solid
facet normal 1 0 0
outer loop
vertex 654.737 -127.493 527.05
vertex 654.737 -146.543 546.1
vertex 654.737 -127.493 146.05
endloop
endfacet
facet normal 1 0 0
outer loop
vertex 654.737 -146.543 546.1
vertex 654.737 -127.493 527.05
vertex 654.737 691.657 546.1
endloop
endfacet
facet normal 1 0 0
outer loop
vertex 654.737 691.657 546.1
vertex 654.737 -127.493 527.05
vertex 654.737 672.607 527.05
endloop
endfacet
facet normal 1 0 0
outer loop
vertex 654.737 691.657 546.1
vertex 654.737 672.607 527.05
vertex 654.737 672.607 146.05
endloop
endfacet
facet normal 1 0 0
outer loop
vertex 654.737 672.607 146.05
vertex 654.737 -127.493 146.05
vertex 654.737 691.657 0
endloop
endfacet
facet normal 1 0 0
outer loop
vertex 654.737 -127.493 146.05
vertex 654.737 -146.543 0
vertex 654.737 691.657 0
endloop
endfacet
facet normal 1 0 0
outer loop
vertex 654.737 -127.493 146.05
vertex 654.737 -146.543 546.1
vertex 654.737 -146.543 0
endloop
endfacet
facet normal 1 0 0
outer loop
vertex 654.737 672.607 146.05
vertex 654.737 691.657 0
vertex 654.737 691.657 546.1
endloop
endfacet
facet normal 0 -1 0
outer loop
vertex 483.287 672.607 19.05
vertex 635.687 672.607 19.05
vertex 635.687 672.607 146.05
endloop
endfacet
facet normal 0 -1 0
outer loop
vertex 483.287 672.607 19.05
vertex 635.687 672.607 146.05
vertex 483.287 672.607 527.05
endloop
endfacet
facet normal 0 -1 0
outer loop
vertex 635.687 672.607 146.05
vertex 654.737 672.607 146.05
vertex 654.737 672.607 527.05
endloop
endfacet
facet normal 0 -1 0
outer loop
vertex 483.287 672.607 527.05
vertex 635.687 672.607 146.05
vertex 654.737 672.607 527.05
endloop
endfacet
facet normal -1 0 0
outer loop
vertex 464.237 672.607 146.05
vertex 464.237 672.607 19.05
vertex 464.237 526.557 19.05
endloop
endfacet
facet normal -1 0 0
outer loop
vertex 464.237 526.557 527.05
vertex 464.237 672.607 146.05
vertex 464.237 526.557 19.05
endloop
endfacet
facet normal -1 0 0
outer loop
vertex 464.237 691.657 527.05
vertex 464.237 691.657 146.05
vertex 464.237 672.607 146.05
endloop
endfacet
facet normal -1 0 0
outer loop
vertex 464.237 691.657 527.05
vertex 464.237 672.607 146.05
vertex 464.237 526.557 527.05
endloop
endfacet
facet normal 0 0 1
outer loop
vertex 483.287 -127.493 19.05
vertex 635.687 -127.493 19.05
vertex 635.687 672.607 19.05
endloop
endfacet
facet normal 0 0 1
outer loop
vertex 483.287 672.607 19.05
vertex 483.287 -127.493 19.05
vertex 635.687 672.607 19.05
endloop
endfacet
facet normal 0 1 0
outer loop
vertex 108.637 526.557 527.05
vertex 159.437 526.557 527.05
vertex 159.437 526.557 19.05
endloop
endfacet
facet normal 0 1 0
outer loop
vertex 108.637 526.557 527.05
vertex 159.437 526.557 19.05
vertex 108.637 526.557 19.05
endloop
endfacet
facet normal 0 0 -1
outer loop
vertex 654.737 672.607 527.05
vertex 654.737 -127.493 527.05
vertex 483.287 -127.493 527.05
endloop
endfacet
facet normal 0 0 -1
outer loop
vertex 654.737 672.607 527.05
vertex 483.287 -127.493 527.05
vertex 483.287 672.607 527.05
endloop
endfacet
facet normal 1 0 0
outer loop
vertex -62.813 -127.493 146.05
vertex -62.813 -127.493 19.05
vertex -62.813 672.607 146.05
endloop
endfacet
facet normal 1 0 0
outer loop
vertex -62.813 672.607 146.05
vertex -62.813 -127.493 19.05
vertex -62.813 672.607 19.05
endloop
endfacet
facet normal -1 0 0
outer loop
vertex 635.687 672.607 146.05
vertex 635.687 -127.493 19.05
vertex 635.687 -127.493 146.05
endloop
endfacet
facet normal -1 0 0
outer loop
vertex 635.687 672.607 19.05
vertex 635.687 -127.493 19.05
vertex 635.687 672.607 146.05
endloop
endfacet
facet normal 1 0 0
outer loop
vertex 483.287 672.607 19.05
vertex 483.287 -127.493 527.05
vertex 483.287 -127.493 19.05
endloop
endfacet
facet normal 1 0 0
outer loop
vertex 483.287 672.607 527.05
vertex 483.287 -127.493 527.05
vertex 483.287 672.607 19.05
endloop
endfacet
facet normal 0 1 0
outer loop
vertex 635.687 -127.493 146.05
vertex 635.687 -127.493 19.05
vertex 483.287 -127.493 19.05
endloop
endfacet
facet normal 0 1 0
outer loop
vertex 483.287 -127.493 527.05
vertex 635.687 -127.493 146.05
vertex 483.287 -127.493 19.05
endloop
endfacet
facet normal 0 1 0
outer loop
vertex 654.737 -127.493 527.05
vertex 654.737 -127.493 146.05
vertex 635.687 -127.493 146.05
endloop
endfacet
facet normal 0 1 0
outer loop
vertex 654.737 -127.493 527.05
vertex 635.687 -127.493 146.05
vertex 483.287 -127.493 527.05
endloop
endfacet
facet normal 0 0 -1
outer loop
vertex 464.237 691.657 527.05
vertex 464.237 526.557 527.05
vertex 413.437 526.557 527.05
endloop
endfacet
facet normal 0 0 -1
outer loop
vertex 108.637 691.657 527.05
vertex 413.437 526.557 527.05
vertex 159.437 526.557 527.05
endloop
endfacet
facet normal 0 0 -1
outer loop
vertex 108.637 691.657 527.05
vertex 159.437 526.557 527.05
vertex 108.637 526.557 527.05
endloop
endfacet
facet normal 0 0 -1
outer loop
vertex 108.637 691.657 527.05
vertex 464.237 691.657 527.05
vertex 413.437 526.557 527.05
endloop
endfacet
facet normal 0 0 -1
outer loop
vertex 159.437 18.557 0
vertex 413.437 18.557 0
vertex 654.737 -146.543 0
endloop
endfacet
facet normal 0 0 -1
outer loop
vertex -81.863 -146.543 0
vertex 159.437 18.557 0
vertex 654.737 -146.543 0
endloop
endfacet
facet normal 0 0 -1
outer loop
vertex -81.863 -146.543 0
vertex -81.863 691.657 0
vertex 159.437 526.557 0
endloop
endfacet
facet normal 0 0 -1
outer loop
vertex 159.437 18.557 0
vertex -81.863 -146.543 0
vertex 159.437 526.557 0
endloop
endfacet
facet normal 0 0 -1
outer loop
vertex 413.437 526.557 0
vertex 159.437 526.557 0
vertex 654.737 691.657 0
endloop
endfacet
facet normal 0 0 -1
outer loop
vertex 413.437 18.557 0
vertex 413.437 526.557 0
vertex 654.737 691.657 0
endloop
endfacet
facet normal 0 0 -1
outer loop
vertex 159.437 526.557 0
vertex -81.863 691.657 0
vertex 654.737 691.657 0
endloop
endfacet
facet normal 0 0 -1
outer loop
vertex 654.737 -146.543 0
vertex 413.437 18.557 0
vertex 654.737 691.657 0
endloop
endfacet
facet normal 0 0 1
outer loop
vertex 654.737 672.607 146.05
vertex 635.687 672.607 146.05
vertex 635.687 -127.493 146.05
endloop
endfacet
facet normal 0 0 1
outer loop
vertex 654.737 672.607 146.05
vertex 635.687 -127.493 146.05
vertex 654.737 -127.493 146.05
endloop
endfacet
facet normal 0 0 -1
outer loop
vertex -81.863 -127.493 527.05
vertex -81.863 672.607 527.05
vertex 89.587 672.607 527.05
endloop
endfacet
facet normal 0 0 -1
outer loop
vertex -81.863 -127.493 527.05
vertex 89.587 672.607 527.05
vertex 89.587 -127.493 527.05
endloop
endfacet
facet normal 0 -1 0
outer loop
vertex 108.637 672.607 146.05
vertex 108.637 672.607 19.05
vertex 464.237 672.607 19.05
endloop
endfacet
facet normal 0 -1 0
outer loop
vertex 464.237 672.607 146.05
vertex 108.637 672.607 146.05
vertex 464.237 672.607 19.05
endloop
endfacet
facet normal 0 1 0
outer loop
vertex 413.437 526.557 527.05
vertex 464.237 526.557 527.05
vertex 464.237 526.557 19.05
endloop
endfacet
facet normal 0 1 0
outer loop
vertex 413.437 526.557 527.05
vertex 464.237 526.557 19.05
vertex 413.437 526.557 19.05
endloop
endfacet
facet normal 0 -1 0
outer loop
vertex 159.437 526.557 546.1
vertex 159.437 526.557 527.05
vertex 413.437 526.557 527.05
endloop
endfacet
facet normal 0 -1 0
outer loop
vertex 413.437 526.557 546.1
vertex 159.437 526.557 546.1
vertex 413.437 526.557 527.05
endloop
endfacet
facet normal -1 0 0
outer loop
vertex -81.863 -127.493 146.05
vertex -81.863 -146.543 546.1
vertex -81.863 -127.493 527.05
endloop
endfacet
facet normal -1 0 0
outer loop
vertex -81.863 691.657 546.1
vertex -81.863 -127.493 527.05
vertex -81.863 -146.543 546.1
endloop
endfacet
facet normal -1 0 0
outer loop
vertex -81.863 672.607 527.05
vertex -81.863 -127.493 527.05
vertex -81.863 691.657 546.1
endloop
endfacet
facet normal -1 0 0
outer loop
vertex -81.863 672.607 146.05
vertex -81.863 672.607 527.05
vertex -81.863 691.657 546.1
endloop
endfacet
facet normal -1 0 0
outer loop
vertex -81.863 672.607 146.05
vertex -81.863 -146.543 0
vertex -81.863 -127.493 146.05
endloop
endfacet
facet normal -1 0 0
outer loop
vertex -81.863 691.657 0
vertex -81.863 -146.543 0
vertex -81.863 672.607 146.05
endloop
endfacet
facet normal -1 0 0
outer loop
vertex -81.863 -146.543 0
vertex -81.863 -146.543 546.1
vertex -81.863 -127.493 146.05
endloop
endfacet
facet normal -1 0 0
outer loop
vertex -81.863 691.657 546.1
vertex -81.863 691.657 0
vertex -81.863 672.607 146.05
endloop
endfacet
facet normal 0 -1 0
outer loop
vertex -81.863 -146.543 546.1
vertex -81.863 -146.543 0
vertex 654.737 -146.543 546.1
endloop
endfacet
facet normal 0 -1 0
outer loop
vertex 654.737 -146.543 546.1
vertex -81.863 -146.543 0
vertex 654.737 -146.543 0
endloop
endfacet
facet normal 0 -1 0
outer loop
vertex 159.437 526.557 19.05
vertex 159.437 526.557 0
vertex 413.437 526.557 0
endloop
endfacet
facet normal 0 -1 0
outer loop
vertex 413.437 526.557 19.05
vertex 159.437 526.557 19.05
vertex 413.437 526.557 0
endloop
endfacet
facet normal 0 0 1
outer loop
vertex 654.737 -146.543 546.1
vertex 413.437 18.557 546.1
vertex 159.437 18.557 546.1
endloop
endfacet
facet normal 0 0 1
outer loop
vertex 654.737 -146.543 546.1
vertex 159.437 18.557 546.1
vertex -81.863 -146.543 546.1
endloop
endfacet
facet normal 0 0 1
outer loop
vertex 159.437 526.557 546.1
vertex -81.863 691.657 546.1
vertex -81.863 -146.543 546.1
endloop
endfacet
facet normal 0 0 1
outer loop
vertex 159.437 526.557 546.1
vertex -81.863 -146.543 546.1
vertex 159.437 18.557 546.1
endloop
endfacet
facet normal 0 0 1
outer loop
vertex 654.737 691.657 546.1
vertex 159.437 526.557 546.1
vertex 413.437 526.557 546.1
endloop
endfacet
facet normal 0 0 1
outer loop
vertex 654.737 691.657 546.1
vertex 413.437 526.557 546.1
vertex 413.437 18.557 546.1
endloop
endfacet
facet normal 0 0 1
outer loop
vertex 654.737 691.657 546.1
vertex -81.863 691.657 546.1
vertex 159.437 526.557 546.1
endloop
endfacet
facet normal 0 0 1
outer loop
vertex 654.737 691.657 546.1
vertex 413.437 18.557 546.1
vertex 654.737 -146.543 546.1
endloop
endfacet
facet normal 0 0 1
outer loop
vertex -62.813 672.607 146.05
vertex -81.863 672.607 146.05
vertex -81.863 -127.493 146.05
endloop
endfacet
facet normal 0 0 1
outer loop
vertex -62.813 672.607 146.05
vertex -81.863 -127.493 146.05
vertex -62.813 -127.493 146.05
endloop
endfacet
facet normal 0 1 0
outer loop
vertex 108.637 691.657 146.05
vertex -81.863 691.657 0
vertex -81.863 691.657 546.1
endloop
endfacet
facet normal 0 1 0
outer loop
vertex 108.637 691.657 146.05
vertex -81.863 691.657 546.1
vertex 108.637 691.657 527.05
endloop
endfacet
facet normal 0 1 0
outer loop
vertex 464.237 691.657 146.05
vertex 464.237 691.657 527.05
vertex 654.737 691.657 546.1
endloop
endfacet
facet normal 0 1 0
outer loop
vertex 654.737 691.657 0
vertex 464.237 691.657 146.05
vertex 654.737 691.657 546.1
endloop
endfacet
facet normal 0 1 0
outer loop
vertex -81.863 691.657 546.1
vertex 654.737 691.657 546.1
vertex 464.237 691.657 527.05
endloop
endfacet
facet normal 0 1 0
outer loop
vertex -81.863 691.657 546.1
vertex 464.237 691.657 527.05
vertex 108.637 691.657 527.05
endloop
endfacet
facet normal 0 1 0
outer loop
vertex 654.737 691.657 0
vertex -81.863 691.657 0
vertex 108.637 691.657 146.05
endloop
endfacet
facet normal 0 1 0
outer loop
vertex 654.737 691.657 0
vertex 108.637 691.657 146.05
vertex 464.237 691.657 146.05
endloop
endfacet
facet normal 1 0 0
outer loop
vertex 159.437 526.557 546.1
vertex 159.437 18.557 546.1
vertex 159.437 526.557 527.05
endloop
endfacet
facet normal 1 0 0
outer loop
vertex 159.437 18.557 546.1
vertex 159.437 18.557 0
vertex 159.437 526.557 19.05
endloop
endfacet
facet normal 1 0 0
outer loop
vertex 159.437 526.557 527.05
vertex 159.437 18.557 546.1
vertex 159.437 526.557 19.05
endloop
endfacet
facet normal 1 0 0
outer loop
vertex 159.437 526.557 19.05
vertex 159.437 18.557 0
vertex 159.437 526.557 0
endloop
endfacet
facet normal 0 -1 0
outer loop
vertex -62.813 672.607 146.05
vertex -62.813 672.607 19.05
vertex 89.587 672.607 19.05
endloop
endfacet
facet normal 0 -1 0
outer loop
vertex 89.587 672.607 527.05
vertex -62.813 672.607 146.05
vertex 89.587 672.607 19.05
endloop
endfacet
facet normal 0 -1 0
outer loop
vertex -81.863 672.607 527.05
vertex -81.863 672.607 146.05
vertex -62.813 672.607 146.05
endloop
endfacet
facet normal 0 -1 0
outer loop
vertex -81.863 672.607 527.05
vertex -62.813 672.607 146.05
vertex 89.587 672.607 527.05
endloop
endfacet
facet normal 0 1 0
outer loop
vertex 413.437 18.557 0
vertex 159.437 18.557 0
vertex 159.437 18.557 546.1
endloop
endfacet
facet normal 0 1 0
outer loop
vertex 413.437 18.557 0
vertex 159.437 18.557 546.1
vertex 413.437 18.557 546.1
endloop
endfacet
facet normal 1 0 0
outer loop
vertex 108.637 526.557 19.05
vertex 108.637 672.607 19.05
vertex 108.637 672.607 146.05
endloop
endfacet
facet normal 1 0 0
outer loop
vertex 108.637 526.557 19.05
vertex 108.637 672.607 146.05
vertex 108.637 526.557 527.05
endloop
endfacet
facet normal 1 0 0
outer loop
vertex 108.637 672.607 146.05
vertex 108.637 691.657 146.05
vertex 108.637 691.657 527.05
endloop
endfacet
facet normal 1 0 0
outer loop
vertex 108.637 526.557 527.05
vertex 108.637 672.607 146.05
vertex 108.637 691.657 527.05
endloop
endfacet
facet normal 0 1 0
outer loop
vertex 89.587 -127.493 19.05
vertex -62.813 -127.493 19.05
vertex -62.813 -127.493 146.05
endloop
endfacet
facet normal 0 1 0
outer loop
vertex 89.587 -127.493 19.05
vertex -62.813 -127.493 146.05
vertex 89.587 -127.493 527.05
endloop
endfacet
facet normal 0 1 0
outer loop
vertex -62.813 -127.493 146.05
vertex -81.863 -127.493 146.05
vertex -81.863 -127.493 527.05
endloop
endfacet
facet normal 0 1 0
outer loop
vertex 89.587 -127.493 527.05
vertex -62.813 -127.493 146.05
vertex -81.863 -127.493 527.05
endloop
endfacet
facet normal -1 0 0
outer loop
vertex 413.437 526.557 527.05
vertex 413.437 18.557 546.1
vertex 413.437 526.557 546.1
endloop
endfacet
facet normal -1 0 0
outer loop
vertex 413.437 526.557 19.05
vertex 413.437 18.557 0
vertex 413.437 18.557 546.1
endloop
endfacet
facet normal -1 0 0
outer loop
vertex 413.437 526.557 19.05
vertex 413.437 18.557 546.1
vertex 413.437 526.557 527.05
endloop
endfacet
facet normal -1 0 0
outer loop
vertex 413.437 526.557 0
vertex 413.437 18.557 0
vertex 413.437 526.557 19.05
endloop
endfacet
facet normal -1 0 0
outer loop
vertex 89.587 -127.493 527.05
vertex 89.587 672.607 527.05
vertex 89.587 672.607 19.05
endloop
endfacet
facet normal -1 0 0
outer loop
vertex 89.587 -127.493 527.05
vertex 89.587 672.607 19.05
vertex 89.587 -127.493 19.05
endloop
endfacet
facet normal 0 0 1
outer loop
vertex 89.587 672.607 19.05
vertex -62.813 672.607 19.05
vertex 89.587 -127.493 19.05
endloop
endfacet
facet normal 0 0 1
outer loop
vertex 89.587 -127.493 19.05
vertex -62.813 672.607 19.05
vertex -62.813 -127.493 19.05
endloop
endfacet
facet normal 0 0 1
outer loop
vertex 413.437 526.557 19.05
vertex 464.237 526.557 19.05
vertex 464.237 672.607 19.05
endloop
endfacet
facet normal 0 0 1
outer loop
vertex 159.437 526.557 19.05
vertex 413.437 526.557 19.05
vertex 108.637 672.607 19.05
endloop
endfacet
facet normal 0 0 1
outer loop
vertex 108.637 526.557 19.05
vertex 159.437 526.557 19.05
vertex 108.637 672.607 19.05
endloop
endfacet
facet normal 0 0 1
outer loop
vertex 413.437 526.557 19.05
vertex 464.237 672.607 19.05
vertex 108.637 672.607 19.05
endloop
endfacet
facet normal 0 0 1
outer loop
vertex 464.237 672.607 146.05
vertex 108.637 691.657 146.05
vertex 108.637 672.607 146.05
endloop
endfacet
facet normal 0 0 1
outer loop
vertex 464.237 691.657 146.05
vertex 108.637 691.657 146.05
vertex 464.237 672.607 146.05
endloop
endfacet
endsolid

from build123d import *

# Parameters (mm, degrees)
F0_W      = 736.6
F0_H      = 838.2
F0_W_2    = 254
F0_H_2    = 508
F1_DEPTH  = 546.1
F2_W      = 800.1
F2_H      = 508
F3_DEPTH  = 171.45
F4_W      = 800.1
F4_H      = 508
F5_DEPTH  = 171.45
F6_W      = 19.05
F6_H      = 800.1
F7_DEPTH  = 127
F8_W      = 19.05
F8_H      = 800.1
F9_DEPTH  = 127
F10_W     = 355.6
F10_H     = 508
F11_DEPTH = 165.1
F12_W     = 355.6
F12_H     = 19.05
F13_DEPTH = 127


with BuildPart() as f1:
    # F0 (on Top) → F1 (new body)
    with BuildSketch(Plane.XY):
        with Locations((286.437001, 272.556877)):
            Rectangle(F0_W, F0_H)
        with Locations((286.437001, 272.556877)):
            Rectangle(F0_W_2, F0_H_2, mode=Mode.SUBTRACT)
    extrude(amount=F1_DEPTH)

    # F2 (on face) → F3 (cut)
    with BuildSketch(Plane.YZ.offset(654.737001)):
        with Locations((272.556877, 273.05)):
            Rectangle(F2_W, F2_H)
    extrude(amount=-F3_DEPTH, mode=Mode.SUBTRACT)

    # F4 (on face) → F5 (cut)
    with BuildSketch(Plane(origin=(-81.862999, 0, 0), x_dir=(0, -1, 0), z_dir=(-1, 0, 0))):
        with Locations((-272.556877, 273.05)):
            Rectangle(F4_W, F4_H)
    extrude(amount=-F5_DEPTH, mode=Mode.SUBTRACT)

    # F6 (on face) → F7 (join)
    with BuildSketch(Plane.XY.offset(19.05)):
        with Locations((645.212001, 272.556877)):
            Rectangle(F6_W, F6_H)
    extrude(amount=F7_DEPTH)

    # F8 (on face) → F9 (join)
    with BuildSketch(Plane.XY.offset(19.05)):
        with Locations((-72.337999, 272.556877)):
            Rectangle(F8_W, F8_H)
    extrude(amount=F9_DEPTH)

    # F10 (on face) → F11 (cut)
    with BuildSketch(Plane(origin=(0, 691.656877, 0), x_dir=(-1, 0, 0), z_dir=(0, 1, 0))):
        with Locations((-286.437001, 273.05)):
            Rectangle(F10_W, F10_H)
    extrude(amount=-F11_DEPTH, mode=Mode.SUBTRACT)

    # F12 (on face) → F13 (join)
    with BuildSketch(Plane.XY.offset(19.05)):
        with Locations((286.437001, 682.131877)):
            Rectangle(F12_W, F12_H)
    extrude(amount=F13_DEPTH)


solid = f1.part
